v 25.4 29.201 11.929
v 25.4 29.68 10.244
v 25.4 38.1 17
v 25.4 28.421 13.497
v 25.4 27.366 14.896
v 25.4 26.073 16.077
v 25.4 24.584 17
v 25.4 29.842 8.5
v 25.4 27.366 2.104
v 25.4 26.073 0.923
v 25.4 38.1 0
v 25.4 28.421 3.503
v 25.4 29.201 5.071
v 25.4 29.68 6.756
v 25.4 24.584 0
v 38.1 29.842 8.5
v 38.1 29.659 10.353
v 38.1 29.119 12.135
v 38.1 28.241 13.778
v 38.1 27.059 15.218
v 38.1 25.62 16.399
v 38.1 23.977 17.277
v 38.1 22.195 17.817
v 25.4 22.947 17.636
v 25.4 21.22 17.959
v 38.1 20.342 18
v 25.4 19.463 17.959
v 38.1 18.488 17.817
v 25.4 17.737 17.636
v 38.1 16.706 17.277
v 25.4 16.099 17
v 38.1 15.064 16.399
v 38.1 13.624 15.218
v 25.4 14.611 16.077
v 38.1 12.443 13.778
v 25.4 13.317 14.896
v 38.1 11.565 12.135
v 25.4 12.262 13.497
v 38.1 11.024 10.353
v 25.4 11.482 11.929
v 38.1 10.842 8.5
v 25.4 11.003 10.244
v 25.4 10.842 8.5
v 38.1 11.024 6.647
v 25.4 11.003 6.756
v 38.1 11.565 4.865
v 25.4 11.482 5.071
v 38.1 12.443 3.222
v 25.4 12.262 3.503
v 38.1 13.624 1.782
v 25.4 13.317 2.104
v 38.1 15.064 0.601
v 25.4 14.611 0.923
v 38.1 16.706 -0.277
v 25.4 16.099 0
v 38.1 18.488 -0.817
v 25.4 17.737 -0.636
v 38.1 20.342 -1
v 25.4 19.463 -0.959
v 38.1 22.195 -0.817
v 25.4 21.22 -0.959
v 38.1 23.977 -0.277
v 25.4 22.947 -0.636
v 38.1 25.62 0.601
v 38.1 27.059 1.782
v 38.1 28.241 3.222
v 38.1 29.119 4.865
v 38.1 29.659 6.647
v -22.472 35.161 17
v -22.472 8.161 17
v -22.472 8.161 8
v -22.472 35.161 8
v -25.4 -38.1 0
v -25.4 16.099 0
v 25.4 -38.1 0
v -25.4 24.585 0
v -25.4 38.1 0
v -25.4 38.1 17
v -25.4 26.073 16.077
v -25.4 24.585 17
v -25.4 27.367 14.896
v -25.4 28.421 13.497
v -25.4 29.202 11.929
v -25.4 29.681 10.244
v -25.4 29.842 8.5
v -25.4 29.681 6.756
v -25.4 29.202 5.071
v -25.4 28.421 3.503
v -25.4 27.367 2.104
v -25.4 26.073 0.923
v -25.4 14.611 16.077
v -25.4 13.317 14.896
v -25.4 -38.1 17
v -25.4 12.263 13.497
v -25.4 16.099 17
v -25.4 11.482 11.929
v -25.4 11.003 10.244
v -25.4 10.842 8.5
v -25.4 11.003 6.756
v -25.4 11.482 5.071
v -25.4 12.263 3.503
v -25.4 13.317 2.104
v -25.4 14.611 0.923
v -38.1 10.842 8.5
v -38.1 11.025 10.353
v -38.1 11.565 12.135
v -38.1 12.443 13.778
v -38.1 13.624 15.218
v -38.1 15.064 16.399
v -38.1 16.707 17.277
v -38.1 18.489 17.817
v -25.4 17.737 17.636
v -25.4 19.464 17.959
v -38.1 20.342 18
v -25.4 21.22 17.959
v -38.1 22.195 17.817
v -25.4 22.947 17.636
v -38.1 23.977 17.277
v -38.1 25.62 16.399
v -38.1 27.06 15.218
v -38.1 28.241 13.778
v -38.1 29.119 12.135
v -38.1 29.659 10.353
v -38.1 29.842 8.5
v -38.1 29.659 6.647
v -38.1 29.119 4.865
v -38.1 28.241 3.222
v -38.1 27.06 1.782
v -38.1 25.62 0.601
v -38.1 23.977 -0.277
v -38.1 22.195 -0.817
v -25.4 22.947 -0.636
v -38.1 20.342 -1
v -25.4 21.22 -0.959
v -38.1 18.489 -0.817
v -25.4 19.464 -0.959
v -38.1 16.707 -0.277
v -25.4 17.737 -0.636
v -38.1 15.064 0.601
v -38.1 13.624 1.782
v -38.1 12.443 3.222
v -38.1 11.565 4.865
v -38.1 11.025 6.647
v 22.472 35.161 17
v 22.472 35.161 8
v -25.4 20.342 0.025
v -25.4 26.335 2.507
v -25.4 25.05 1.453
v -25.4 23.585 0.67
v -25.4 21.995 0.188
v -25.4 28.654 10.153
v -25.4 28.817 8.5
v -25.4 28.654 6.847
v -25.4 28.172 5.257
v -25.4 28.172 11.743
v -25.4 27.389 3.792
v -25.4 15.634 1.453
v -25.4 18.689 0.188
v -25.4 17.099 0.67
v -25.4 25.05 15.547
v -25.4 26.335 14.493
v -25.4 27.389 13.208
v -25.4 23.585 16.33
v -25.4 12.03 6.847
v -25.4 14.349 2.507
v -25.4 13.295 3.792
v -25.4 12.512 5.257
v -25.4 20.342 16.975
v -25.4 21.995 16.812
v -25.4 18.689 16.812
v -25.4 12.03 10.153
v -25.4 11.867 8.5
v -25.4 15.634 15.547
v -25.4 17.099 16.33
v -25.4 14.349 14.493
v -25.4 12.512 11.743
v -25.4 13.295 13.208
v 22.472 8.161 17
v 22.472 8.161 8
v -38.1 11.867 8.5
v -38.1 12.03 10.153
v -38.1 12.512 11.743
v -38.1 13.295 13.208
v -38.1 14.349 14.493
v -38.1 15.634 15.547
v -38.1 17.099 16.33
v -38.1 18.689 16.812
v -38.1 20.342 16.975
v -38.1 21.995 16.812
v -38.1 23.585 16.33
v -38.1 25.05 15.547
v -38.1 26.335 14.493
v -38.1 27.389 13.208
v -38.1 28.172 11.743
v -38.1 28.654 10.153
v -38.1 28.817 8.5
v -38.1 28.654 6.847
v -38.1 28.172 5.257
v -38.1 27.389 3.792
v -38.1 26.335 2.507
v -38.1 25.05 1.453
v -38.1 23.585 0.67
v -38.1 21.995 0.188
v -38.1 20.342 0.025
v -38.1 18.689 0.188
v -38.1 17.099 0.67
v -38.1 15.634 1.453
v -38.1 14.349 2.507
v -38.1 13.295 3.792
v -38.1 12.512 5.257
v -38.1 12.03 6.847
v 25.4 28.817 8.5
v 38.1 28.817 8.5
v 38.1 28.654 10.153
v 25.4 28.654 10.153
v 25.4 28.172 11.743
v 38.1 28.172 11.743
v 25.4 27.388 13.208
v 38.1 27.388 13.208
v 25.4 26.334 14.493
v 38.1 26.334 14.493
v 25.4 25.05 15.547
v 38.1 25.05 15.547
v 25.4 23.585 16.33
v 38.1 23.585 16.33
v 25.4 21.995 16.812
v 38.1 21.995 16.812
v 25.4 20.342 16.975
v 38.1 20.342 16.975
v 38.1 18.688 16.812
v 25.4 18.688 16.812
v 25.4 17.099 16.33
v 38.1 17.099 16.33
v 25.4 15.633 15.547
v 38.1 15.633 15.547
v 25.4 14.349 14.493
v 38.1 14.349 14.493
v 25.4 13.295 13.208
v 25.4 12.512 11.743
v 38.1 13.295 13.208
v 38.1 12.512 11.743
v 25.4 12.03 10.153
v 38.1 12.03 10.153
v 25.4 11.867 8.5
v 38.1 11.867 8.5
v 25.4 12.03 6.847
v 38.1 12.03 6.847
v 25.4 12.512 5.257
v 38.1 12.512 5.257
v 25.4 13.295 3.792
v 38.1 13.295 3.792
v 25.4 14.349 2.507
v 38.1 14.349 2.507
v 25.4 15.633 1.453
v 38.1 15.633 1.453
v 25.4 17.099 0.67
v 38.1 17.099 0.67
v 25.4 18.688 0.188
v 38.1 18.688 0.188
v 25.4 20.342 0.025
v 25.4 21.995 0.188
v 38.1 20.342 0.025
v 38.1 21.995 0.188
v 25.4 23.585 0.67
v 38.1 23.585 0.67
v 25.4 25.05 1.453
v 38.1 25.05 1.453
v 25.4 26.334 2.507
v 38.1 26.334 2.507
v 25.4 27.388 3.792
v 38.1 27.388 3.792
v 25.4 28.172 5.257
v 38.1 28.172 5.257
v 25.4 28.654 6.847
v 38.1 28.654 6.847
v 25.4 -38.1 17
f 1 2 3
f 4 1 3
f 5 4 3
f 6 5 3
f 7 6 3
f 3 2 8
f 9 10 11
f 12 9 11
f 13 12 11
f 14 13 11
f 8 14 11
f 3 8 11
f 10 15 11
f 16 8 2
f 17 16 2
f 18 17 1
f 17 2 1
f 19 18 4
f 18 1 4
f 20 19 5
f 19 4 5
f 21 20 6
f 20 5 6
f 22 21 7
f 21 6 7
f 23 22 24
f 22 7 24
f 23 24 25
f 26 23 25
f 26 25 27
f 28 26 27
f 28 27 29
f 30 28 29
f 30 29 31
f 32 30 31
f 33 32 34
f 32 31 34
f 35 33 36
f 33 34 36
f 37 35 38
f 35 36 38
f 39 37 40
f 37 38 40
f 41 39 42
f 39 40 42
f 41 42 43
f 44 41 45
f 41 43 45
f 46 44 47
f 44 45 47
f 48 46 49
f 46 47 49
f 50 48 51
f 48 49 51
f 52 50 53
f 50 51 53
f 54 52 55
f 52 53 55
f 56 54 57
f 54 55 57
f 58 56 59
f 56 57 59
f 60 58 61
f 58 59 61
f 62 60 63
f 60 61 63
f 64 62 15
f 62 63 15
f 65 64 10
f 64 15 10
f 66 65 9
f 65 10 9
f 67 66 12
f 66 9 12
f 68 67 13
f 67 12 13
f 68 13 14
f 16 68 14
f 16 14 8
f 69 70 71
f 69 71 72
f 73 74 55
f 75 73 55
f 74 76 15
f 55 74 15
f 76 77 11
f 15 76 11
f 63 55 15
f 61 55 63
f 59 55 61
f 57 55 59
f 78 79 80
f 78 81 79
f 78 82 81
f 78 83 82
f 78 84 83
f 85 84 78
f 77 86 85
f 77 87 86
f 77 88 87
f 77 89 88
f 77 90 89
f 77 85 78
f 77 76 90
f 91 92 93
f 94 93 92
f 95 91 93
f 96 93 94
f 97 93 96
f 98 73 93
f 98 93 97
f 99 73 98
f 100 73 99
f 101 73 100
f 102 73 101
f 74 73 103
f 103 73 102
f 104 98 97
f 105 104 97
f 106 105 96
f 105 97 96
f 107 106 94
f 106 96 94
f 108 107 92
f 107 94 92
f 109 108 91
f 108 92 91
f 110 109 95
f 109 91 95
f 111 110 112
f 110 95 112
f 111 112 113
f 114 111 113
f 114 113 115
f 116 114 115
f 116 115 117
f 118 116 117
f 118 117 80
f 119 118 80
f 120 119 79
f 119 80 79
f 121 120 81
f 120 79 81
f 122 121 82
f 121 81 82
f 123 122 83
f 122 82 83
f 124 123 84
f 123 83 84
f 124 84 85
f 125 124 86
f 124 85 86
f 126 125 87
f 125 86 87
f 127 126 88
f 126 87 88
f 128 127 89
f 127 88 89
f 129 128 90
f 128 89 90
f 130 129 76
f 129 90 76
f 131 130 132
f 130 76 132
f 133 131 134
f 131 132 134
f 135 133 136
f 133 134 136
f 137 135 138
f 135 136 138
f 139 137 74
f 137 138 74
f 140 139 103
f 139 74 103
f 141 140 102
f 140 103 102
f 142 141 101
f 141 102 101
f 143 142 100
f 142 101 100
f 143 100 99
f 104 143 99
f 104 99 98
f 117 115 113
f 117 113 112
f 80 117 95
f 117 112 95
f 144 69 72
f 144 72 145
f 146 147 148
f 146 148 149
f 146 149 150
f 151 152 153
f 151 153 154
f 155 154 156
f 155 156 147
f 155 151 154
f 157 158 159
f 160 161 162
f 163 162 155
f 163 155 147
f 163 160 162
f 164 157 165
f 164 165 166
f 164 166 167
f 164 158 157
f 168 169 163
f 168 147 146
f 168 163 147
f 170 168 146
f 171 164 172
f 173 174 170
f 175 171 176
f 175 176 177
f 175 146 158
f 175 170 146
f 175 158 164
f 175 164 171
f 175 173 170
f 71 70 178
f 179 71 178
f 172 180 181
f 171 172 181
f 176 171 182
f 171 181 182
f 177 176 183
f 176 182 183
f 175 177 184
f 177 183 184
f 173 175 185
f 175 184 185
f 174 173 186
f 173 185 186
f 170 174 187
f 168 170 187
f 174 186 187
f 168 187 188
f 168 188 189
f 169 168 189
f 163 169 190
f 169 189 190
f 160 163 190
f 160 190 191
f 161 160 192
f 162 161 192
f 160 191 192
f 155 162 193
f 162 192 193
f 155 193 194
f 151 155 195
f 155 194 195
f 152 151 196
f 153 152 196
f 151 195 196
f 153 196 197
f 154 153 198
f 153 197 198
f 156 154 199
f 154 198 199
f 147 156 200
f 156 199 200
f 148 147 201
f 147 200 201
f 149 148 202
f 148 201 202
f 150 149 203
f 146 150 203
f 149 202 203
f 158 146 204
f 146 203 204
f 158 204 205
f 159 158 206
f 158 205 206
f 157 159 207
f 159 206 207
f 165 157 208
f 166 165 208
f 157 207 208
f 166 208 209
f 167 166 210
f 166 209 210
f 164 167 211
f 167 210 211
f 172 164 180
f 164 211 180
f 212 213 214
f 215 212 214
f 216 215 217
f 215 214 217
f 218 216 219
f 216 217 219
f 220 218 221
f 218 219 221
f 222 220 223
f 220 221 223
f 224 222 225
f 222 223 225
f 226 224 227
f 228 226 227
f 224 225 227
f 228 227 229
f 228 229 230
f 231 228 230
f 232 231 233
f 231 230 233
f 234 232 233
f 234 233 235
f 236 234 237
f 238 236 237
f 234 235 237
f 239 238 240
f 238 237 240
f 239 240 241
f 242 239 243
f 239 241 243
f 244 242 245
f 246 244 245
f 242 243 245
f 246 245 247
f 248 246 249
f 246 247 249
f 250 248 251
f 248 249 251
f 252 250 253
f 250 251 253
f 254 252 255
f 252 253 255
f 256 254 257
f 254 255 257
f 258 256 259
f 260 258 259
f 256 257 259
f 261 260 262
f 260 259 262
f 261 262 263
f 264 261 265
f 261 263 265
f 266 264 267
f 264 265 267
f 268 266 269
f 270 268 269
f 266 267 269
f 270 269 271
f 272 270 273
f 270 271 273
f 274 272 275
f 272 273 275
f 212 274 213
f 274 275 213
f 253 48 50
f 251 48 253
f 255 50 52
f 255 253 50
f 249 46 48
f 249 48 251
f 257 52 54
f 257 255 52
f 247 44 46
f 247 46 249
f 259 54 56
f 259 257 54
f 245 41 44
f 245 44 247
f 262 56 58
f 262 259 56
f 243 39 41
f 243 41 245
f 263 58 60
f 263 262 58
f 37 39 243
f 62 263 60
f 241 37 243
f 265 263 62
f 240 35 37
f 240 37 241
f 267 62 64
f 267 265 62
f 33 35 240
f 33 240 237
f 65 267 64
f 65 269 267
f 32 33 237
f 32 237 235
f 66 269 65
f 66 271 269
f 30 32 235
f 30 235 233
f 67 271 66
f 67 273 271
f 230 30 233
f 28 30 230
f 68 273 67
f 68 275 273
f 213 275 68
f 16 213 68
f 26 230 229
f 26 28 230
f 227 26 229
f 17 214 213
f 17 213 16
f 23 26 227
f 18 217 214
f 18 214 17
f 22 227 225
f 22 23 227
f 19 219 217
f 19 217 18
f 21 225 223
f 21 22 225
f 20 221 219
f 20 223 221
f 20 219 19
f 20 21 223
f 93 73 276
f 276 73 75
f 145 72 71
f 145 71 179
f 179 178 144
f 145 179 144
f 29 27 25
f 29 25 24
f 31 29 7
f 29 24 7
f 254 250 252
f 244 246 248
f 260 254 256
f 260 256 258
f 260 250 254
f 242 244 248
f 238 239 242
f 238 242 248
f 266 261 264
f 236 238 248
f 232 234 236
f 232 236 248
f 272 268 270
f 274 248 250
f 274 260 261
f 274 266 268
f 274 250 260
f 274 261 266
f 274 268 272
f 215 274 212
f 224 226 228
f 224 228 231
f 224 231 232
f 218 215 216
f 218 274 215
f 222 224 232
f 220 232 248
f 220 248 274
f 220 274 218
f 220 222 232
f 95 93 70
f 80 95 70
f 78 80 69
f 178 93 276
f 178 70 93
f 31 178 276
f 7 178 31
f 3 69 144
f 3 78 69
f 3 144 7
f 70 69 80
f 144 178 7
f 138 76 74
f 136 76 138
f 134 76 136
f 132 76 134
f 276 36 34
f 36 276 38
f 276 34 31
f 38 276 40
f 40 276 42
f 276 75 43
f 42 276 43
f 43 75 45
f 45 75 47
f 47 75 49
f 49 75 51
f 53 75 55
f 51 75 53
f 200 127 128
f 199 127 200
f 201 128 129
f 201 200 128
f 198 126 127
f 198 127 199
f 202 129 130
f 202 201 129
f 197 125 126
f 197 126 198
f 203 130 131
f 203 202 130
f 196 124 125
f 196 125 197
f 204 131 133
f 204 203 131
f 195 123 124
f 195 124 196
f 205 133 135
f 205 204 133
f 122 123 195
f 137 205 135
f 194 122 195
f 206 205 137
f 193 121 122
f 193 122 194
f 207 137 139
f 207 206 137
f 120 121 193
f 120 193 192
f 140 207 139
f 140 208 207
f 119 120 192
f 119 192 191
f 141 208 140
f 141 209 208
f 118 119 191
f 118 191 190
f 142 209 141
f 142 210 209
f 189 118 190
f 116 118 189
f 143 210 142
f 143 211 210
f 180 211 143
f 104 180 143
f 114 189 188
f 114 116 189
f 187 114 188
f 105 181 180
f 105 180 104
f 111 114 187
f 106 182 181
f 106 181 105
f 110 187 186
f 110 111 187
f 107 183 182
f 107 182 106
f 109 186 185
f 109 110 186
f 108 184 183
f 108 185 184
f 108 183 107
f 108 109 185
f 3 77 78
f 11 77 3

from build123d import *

# Parameters (mm, degrees)
F0_W      = 50.8
F0_H      = 76.2
F1_DEPTH  = 17
F3_W      = 44.944652
F3_H      = 27
F4_DEPTH  = 9
F5_R      = 9.5
F6_DEPTH  = 12.7
F7_R      = 8.475
F8_DEPTH  = 12.7
F9_R      = 9.5
F10_DEPTH = 12.7
F11_R     = 8.475
F12_DEPTH = 12.7


with BuildPart() as f1:
    # F0 (on Top) → F1 (new body)
    with BuildSketch(Plane.XY):
        Rectangle(F0_W, F0_H)
    extrude(amount=F1_DEPTH)

    # F3 (on face) → F4 (cut)
    with BuildSketch(Plane.XY.offset(17)):
        with Locations((0, 21.661439)):
            Rectangle(F3_W, F3_H)
    extrude(amount=-F4_DEPTH, mode=Mode.SUBTRACT)

    # F5 (on face) → F6 (join)
    with BuildSketch(Plane.YZ.offset(25.4)):
        with Locations((20.341752, 8.5)):
            Circle(F5_R)
    extrude(amount=F6_DEPTH)

    # F7 (on face) → F8 (cut)
    with BuildSketch(Plane.YZ.offset(38.1)):
        with Locations((20.341752, 8.5)):
            Circle(F7_R)
    extrude(amount=-F8_DEPTH, mode=Mode.SUBTRACT)

    # F9 (on face) → F10 (join)
    with BuildSketch(Plane(origin=(-25.4, 0, 0), x_dir=(0, -1, 0), z_dir=(-1, 0, 0))):
        with Locations((-20.342, 8.5)):
            Circle(F9_R)
    extrude(amount=F10_DEPTH)

    # F11 (on face) → F12 (cut)
    with BuildSketch(Plane(origin=(-38.1, 0, 0), x_dir=(0, -1, 0), z_dir=(-1, 0, 0))):
        with Locations((-20.342, 8.5)):
            Circle(F11_R)
    extrude(amount=-F12_DEPTH, mode=Mode.SUBTRACT)


solid = f1.part
